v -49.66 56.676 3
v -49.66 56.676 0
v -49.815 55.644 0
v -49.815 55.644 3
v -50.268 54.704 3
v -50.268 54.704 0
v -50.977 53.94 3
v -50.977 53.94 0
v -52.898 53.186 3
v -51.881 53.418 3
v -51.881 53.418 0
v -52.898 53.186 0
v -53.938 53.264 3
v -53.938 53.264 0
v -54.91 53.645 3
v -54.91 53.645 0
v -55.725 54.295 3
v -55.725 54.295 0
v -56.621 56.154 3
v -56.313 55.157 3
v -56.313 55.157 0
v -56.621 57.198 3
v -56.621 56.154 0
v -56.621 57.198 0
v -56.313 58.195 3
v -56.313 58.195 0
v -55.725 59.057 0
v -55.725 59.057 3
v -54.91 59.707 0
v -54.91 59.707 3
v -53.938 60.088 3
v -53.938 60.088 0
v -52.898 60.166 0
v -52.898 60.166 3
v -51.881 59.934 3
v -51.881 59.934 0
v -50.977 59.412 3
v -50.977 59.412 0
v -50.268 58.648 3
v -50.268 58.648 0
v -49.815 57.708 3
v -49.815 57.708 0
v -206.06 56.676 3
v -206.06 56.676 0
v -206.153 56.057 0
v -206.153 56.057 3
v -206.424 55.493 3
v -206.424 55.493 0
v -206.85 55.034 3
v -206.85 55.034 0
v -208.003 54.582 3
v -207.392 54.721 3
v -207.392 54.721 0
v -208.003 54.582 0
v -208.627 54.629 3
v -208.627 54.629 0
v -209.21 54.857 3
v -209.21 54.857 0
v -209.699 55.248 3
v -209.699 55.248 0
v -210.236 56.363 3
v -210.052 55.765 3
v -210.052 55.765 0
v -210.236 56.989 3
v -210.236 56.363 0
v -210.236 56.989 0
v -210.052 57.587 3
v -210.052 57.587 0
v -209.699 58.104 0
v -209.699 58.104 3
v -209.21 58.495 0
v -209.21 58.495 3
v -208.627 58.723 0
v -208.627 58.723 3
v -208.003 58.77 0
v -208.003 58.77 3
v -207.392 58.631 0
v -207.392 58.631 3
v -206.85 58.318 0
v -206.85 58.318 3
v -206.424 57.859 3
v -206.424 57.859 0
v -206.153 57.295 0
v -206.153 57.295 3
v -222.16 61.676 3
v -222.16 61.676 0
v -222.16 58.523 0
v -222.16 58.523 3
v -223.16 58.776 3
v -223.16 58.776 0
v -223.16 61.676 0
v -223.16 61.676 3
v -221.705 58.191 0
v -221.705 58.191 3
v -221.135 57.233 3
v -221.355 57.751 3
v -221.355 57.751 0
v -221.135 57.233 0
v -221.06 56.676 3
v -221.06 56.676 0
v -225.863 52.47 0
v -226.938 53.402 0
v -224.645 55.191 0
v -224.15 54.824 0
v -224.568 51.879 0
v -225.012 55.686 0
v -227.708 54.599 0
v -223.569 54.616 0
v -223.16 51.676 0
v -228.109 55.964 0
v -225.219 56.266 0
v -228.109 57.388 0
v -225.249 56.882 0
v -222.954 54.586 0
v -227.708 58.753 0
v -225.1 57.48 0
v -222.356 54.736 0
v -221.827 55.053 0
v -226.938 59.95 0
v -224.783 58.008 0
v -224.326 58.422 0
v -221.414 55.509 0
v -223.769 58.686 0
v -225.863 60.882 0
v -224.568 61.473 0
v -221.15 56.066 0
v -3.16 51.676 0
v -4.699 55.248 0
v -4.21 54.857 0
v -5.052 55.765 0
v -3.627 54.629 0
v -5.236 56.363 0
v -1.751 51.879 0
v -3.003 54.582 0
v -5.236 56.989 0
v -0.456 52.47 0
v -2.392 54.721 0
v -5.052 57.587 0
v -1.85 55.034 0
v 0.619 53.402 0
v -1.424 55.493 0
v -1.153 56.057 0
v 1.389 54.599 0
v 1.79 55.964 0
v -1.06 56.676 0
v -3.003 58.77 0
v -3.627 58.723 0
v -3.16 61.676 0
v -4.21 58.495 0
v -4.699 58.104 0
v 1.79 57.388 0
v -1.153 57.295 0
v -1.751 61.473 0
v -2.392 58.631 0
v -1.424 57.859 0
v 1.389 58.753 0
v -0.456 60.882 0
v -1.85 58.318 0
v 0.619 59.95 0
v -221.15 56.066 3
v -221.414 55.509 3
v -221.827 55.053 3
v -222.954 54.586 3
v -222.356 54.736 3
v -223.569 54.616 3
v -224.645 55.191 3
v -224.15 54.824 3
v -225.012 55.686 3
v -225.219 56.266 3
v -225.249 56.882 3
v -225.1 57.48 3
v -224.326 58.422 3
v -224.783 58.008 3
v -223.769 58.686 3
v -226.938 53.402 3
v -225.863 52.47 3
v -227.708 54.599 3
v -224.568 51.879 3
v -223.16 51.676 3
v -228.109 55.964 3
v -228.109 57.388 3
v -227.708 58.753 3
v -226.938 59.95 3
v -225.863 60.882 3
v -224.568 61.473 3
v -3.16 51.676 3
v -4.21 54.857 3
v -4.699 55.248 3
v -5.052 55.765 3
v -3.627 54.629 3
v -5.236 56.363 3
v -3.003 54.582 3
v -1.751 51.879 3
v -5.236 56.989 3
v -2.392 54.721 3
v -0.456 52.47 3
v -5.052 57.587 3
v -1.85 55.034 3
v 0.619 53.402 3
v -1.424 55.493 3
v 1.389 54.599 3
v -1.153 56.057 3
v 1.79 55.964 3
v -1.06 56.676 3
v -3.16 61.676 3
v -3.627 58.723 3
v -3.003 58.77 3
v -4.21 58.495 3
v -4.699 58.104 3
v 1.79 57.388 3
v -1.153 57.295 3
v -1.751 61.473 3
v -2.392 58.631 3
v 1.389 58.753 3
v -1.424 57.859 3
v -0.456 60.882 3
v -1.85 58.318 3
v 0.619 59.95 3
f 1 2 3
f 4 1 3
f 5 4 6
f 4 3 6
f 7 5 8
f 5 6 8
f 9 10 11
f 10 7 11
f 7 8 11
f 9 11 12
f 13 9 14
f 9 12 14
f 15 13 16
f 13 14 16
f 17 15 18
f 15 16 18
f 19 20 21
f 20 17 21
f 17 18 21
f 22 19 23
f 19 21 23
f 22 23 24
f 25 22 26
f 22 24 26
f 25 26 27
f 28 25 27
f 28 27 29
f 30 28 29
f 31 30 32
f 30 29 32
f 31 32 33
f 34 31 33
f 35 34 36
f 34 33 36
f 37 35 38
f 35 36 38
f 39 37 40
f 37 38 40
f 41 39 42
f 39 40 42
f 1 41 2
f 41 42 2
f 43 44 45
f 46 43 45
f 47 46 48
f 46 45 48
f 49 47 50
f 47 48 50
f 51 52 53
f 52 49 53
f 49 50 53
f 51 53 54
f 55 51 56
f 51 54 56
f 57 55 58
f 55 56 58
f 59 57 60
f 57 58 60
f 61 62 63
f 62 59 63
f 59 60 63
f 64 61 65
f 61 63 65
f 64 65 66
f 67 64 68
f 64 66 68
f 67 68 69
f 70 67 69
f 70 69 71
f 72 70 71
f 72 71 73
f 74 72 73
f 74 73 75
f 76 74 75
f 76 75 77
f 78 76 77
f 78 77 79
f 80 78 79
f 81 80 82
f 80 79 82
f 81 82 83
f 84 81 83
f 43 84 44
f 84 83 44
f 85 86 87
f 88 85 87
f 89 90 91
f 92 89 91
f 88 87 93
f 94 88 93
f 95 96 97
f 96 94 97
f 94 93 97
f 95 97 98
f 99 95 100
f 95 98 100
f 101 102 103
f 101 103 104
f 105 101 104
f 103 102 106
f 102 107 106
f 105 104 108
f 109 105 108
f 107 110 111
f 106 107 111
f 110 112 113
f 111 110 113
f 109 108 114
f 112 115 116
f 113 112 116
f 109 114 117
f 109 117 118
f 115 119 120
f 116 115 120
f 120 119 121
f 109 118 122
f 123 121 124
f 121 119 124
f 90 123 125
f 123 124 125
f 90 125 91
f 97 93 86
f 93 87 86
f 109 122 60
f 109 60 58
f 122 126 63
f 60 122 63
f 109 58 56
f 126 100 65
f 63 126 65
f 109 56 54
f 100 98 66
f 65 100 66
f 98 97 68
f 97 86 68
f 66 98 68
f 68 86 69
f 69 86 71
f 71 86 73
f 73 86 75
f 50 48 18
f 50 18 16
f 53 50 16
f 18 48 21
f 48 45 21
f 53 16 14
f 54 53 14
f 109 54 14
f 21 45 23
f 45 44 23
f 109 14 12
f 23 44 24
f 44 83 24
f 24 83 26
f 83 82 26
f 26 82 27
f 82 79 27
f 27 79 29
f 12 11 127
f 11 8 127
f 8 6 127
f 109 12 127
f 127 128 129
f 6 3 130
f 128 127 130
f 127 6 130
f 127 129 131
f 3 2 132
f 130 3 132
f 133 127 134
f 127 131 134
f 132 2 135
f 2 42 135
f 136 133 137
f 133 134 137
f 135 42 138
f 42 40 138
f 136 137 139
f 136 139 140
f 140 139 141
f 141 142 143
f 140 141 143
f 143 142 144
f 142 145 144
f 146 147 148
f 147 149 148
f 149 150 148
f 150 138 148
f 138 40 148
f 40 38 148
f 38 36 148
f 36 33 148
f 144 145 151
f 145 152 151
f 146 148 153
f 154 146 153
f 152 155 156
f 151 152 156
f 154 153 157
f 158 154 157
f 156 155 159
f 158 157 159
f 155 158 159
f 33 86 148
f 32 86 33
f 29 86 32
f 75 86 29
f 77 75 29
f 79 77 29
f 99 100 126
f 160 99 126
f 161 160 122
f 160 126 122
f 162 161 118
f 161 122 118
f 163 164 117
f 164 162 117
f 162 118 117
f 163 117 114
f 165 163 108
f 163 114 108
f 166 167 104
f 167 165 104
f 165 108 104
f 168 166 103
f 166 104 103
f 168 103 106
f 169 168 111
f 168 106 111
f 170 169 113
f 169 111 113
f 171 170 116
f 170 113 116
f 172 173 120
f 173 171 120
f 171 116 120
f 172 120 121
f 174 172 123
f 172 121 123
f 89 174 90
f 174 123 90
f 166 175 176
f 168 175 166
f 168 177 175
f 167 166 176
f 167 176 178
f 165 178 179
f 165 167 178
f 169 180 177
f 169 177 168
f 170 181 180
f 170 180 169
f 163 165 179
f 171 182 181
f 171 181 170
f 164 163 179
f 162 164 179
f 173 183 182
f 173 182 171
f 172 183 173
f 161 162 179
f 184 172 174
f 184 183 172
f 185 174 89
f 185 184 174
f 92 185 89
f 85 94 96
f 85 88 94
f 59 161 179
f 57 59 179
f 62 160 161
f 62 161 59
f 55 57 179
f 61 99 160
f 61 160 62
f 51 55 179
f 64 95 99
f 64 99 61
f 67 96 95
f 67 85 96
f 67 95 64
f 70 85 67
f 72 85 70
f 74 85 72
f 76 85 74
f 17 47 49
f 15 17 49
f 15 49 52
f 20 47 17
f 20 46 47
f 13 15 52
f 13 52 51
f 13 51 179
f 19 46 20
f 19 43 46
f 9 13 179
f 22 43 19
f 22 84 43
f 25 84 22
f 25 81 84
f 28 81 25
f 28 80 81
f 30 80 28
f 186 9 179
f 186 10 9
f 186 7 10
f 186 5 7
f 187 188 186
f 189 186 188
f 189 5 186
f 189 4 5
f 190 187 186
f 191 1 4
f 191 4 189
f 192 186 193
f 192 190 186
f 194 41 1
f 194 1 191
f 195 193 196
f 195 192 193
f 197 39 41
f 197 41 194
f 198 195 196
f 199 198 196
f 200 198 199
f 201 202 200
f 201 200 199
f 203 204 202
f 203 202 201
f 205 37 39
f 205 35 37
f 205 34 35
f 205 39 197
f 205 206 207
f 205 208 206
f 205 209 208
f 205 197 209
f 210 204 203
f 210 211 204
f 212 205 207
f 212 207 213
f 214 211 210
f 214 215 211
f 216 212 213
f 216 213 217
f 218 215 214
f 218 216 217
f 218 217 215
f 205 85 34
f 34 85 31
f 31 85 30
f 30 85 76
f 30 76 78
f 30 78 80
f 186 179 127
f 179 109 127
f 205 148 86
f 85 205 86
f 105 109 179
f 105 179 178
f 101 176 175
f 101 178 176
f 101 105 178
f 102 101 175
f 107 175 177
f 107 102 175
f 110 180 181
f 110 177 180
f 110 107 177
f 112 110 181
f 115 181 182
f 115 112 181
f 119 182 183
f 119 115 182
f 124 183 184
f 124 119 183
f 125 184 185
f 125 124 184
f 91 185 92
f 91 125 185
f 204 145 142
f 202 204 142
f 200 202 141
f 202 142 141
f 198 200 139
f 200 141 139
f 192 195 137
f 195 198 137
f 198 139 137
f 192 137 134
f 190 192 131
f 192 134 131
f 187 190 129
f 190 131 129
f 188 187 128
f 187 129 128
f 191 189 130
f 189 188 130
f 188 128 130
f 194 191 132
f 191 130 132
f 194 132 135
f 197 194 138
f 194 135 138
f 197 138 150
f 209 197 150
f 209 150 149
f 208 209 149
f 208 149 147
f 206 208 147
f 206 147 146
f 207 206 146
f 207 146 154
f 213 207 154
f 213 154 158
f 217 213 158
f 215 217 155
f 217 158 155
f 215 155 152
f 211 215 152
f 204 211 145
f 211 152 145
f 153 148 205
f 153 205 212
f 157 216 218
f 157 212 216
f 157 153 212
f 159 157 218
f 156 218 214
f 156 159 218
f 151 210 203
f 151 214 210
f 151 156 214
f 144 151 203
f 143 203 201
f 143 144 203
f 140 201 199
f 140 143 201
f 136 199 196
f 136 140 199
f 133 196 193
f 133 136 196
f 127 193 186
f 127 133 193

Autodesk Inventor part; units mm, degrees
ref_plane "YZ Plane" through (0, 0, 0) normal (1, 0, 0) x (0, 1, 0)
ref_plane "XZ Plane" through (0, 0, 0) normal (0, 1, 0) x (-1, 0, 0)
ref_plane "XY Plane" through (0, 0, 0) normal (0, 0, 1) x (1, 0, 0)
sketch "草圖1" plane through (0, 0, 0) normal (0, 0, 1) x (1, 0, 0)
  line L0 (-223.1596, 56.676) -> (-3.1596, 56.676) construction
  line L1 (-223.1596, 51.676) -> (-3.1596, 51.676)
  line L2 (-3.1596, 61.676) -> (-223.1596, 61.676)
  arc A0 (-223.1596, 61.676) -> (-223.1596, 51.676) centre (-223.1596, 56.676) ccw
  arc A1 (-3.1596, 51.676) -> (-3.1596, 61.676) centre (-3.1596, 56.676) ccw
  circle A2 centre (-223.1596, 56.676) radius 2.1
  circle A3 centre (-3.1596, 56.676) radius 2.1
  circle A4 centre (-208.1596, 56.676) radius 2.1
  circle A5 centre (-53.1596, 56.676) radius 3.5
  line L3 (-223.1596, 61.676) -> (-222.1596, 61.676)
  line L4 (-222.1596, 61.676) -> (-222.1596, 58.5227)
  line L5 (-222.1596, 58.5227) -> (-223.1596, 58.5227)
  line L6 (-223.1596, 58.5227) -> (-223.1596, 61.676)
  point P0 (0, 0)
  point P1 (-113.1596, 56.676)
  point P2 (-223.1596, 58.776)
  dimension "d2" = 4.2
  dimension "d0" = 220
  dimension "d1" = 10
  dimension "d3" = 4.2
  dimension "d4" = 4.2
  dimension "d5" = 15
  dimension "d8" = 7
  dimension "d9" = 50
  dimension "d10" = 1
extrude "擠出1" add sketch "草圖1" along normal blind 3 contours A0 L6 A2 L4 L2 A1 L1
